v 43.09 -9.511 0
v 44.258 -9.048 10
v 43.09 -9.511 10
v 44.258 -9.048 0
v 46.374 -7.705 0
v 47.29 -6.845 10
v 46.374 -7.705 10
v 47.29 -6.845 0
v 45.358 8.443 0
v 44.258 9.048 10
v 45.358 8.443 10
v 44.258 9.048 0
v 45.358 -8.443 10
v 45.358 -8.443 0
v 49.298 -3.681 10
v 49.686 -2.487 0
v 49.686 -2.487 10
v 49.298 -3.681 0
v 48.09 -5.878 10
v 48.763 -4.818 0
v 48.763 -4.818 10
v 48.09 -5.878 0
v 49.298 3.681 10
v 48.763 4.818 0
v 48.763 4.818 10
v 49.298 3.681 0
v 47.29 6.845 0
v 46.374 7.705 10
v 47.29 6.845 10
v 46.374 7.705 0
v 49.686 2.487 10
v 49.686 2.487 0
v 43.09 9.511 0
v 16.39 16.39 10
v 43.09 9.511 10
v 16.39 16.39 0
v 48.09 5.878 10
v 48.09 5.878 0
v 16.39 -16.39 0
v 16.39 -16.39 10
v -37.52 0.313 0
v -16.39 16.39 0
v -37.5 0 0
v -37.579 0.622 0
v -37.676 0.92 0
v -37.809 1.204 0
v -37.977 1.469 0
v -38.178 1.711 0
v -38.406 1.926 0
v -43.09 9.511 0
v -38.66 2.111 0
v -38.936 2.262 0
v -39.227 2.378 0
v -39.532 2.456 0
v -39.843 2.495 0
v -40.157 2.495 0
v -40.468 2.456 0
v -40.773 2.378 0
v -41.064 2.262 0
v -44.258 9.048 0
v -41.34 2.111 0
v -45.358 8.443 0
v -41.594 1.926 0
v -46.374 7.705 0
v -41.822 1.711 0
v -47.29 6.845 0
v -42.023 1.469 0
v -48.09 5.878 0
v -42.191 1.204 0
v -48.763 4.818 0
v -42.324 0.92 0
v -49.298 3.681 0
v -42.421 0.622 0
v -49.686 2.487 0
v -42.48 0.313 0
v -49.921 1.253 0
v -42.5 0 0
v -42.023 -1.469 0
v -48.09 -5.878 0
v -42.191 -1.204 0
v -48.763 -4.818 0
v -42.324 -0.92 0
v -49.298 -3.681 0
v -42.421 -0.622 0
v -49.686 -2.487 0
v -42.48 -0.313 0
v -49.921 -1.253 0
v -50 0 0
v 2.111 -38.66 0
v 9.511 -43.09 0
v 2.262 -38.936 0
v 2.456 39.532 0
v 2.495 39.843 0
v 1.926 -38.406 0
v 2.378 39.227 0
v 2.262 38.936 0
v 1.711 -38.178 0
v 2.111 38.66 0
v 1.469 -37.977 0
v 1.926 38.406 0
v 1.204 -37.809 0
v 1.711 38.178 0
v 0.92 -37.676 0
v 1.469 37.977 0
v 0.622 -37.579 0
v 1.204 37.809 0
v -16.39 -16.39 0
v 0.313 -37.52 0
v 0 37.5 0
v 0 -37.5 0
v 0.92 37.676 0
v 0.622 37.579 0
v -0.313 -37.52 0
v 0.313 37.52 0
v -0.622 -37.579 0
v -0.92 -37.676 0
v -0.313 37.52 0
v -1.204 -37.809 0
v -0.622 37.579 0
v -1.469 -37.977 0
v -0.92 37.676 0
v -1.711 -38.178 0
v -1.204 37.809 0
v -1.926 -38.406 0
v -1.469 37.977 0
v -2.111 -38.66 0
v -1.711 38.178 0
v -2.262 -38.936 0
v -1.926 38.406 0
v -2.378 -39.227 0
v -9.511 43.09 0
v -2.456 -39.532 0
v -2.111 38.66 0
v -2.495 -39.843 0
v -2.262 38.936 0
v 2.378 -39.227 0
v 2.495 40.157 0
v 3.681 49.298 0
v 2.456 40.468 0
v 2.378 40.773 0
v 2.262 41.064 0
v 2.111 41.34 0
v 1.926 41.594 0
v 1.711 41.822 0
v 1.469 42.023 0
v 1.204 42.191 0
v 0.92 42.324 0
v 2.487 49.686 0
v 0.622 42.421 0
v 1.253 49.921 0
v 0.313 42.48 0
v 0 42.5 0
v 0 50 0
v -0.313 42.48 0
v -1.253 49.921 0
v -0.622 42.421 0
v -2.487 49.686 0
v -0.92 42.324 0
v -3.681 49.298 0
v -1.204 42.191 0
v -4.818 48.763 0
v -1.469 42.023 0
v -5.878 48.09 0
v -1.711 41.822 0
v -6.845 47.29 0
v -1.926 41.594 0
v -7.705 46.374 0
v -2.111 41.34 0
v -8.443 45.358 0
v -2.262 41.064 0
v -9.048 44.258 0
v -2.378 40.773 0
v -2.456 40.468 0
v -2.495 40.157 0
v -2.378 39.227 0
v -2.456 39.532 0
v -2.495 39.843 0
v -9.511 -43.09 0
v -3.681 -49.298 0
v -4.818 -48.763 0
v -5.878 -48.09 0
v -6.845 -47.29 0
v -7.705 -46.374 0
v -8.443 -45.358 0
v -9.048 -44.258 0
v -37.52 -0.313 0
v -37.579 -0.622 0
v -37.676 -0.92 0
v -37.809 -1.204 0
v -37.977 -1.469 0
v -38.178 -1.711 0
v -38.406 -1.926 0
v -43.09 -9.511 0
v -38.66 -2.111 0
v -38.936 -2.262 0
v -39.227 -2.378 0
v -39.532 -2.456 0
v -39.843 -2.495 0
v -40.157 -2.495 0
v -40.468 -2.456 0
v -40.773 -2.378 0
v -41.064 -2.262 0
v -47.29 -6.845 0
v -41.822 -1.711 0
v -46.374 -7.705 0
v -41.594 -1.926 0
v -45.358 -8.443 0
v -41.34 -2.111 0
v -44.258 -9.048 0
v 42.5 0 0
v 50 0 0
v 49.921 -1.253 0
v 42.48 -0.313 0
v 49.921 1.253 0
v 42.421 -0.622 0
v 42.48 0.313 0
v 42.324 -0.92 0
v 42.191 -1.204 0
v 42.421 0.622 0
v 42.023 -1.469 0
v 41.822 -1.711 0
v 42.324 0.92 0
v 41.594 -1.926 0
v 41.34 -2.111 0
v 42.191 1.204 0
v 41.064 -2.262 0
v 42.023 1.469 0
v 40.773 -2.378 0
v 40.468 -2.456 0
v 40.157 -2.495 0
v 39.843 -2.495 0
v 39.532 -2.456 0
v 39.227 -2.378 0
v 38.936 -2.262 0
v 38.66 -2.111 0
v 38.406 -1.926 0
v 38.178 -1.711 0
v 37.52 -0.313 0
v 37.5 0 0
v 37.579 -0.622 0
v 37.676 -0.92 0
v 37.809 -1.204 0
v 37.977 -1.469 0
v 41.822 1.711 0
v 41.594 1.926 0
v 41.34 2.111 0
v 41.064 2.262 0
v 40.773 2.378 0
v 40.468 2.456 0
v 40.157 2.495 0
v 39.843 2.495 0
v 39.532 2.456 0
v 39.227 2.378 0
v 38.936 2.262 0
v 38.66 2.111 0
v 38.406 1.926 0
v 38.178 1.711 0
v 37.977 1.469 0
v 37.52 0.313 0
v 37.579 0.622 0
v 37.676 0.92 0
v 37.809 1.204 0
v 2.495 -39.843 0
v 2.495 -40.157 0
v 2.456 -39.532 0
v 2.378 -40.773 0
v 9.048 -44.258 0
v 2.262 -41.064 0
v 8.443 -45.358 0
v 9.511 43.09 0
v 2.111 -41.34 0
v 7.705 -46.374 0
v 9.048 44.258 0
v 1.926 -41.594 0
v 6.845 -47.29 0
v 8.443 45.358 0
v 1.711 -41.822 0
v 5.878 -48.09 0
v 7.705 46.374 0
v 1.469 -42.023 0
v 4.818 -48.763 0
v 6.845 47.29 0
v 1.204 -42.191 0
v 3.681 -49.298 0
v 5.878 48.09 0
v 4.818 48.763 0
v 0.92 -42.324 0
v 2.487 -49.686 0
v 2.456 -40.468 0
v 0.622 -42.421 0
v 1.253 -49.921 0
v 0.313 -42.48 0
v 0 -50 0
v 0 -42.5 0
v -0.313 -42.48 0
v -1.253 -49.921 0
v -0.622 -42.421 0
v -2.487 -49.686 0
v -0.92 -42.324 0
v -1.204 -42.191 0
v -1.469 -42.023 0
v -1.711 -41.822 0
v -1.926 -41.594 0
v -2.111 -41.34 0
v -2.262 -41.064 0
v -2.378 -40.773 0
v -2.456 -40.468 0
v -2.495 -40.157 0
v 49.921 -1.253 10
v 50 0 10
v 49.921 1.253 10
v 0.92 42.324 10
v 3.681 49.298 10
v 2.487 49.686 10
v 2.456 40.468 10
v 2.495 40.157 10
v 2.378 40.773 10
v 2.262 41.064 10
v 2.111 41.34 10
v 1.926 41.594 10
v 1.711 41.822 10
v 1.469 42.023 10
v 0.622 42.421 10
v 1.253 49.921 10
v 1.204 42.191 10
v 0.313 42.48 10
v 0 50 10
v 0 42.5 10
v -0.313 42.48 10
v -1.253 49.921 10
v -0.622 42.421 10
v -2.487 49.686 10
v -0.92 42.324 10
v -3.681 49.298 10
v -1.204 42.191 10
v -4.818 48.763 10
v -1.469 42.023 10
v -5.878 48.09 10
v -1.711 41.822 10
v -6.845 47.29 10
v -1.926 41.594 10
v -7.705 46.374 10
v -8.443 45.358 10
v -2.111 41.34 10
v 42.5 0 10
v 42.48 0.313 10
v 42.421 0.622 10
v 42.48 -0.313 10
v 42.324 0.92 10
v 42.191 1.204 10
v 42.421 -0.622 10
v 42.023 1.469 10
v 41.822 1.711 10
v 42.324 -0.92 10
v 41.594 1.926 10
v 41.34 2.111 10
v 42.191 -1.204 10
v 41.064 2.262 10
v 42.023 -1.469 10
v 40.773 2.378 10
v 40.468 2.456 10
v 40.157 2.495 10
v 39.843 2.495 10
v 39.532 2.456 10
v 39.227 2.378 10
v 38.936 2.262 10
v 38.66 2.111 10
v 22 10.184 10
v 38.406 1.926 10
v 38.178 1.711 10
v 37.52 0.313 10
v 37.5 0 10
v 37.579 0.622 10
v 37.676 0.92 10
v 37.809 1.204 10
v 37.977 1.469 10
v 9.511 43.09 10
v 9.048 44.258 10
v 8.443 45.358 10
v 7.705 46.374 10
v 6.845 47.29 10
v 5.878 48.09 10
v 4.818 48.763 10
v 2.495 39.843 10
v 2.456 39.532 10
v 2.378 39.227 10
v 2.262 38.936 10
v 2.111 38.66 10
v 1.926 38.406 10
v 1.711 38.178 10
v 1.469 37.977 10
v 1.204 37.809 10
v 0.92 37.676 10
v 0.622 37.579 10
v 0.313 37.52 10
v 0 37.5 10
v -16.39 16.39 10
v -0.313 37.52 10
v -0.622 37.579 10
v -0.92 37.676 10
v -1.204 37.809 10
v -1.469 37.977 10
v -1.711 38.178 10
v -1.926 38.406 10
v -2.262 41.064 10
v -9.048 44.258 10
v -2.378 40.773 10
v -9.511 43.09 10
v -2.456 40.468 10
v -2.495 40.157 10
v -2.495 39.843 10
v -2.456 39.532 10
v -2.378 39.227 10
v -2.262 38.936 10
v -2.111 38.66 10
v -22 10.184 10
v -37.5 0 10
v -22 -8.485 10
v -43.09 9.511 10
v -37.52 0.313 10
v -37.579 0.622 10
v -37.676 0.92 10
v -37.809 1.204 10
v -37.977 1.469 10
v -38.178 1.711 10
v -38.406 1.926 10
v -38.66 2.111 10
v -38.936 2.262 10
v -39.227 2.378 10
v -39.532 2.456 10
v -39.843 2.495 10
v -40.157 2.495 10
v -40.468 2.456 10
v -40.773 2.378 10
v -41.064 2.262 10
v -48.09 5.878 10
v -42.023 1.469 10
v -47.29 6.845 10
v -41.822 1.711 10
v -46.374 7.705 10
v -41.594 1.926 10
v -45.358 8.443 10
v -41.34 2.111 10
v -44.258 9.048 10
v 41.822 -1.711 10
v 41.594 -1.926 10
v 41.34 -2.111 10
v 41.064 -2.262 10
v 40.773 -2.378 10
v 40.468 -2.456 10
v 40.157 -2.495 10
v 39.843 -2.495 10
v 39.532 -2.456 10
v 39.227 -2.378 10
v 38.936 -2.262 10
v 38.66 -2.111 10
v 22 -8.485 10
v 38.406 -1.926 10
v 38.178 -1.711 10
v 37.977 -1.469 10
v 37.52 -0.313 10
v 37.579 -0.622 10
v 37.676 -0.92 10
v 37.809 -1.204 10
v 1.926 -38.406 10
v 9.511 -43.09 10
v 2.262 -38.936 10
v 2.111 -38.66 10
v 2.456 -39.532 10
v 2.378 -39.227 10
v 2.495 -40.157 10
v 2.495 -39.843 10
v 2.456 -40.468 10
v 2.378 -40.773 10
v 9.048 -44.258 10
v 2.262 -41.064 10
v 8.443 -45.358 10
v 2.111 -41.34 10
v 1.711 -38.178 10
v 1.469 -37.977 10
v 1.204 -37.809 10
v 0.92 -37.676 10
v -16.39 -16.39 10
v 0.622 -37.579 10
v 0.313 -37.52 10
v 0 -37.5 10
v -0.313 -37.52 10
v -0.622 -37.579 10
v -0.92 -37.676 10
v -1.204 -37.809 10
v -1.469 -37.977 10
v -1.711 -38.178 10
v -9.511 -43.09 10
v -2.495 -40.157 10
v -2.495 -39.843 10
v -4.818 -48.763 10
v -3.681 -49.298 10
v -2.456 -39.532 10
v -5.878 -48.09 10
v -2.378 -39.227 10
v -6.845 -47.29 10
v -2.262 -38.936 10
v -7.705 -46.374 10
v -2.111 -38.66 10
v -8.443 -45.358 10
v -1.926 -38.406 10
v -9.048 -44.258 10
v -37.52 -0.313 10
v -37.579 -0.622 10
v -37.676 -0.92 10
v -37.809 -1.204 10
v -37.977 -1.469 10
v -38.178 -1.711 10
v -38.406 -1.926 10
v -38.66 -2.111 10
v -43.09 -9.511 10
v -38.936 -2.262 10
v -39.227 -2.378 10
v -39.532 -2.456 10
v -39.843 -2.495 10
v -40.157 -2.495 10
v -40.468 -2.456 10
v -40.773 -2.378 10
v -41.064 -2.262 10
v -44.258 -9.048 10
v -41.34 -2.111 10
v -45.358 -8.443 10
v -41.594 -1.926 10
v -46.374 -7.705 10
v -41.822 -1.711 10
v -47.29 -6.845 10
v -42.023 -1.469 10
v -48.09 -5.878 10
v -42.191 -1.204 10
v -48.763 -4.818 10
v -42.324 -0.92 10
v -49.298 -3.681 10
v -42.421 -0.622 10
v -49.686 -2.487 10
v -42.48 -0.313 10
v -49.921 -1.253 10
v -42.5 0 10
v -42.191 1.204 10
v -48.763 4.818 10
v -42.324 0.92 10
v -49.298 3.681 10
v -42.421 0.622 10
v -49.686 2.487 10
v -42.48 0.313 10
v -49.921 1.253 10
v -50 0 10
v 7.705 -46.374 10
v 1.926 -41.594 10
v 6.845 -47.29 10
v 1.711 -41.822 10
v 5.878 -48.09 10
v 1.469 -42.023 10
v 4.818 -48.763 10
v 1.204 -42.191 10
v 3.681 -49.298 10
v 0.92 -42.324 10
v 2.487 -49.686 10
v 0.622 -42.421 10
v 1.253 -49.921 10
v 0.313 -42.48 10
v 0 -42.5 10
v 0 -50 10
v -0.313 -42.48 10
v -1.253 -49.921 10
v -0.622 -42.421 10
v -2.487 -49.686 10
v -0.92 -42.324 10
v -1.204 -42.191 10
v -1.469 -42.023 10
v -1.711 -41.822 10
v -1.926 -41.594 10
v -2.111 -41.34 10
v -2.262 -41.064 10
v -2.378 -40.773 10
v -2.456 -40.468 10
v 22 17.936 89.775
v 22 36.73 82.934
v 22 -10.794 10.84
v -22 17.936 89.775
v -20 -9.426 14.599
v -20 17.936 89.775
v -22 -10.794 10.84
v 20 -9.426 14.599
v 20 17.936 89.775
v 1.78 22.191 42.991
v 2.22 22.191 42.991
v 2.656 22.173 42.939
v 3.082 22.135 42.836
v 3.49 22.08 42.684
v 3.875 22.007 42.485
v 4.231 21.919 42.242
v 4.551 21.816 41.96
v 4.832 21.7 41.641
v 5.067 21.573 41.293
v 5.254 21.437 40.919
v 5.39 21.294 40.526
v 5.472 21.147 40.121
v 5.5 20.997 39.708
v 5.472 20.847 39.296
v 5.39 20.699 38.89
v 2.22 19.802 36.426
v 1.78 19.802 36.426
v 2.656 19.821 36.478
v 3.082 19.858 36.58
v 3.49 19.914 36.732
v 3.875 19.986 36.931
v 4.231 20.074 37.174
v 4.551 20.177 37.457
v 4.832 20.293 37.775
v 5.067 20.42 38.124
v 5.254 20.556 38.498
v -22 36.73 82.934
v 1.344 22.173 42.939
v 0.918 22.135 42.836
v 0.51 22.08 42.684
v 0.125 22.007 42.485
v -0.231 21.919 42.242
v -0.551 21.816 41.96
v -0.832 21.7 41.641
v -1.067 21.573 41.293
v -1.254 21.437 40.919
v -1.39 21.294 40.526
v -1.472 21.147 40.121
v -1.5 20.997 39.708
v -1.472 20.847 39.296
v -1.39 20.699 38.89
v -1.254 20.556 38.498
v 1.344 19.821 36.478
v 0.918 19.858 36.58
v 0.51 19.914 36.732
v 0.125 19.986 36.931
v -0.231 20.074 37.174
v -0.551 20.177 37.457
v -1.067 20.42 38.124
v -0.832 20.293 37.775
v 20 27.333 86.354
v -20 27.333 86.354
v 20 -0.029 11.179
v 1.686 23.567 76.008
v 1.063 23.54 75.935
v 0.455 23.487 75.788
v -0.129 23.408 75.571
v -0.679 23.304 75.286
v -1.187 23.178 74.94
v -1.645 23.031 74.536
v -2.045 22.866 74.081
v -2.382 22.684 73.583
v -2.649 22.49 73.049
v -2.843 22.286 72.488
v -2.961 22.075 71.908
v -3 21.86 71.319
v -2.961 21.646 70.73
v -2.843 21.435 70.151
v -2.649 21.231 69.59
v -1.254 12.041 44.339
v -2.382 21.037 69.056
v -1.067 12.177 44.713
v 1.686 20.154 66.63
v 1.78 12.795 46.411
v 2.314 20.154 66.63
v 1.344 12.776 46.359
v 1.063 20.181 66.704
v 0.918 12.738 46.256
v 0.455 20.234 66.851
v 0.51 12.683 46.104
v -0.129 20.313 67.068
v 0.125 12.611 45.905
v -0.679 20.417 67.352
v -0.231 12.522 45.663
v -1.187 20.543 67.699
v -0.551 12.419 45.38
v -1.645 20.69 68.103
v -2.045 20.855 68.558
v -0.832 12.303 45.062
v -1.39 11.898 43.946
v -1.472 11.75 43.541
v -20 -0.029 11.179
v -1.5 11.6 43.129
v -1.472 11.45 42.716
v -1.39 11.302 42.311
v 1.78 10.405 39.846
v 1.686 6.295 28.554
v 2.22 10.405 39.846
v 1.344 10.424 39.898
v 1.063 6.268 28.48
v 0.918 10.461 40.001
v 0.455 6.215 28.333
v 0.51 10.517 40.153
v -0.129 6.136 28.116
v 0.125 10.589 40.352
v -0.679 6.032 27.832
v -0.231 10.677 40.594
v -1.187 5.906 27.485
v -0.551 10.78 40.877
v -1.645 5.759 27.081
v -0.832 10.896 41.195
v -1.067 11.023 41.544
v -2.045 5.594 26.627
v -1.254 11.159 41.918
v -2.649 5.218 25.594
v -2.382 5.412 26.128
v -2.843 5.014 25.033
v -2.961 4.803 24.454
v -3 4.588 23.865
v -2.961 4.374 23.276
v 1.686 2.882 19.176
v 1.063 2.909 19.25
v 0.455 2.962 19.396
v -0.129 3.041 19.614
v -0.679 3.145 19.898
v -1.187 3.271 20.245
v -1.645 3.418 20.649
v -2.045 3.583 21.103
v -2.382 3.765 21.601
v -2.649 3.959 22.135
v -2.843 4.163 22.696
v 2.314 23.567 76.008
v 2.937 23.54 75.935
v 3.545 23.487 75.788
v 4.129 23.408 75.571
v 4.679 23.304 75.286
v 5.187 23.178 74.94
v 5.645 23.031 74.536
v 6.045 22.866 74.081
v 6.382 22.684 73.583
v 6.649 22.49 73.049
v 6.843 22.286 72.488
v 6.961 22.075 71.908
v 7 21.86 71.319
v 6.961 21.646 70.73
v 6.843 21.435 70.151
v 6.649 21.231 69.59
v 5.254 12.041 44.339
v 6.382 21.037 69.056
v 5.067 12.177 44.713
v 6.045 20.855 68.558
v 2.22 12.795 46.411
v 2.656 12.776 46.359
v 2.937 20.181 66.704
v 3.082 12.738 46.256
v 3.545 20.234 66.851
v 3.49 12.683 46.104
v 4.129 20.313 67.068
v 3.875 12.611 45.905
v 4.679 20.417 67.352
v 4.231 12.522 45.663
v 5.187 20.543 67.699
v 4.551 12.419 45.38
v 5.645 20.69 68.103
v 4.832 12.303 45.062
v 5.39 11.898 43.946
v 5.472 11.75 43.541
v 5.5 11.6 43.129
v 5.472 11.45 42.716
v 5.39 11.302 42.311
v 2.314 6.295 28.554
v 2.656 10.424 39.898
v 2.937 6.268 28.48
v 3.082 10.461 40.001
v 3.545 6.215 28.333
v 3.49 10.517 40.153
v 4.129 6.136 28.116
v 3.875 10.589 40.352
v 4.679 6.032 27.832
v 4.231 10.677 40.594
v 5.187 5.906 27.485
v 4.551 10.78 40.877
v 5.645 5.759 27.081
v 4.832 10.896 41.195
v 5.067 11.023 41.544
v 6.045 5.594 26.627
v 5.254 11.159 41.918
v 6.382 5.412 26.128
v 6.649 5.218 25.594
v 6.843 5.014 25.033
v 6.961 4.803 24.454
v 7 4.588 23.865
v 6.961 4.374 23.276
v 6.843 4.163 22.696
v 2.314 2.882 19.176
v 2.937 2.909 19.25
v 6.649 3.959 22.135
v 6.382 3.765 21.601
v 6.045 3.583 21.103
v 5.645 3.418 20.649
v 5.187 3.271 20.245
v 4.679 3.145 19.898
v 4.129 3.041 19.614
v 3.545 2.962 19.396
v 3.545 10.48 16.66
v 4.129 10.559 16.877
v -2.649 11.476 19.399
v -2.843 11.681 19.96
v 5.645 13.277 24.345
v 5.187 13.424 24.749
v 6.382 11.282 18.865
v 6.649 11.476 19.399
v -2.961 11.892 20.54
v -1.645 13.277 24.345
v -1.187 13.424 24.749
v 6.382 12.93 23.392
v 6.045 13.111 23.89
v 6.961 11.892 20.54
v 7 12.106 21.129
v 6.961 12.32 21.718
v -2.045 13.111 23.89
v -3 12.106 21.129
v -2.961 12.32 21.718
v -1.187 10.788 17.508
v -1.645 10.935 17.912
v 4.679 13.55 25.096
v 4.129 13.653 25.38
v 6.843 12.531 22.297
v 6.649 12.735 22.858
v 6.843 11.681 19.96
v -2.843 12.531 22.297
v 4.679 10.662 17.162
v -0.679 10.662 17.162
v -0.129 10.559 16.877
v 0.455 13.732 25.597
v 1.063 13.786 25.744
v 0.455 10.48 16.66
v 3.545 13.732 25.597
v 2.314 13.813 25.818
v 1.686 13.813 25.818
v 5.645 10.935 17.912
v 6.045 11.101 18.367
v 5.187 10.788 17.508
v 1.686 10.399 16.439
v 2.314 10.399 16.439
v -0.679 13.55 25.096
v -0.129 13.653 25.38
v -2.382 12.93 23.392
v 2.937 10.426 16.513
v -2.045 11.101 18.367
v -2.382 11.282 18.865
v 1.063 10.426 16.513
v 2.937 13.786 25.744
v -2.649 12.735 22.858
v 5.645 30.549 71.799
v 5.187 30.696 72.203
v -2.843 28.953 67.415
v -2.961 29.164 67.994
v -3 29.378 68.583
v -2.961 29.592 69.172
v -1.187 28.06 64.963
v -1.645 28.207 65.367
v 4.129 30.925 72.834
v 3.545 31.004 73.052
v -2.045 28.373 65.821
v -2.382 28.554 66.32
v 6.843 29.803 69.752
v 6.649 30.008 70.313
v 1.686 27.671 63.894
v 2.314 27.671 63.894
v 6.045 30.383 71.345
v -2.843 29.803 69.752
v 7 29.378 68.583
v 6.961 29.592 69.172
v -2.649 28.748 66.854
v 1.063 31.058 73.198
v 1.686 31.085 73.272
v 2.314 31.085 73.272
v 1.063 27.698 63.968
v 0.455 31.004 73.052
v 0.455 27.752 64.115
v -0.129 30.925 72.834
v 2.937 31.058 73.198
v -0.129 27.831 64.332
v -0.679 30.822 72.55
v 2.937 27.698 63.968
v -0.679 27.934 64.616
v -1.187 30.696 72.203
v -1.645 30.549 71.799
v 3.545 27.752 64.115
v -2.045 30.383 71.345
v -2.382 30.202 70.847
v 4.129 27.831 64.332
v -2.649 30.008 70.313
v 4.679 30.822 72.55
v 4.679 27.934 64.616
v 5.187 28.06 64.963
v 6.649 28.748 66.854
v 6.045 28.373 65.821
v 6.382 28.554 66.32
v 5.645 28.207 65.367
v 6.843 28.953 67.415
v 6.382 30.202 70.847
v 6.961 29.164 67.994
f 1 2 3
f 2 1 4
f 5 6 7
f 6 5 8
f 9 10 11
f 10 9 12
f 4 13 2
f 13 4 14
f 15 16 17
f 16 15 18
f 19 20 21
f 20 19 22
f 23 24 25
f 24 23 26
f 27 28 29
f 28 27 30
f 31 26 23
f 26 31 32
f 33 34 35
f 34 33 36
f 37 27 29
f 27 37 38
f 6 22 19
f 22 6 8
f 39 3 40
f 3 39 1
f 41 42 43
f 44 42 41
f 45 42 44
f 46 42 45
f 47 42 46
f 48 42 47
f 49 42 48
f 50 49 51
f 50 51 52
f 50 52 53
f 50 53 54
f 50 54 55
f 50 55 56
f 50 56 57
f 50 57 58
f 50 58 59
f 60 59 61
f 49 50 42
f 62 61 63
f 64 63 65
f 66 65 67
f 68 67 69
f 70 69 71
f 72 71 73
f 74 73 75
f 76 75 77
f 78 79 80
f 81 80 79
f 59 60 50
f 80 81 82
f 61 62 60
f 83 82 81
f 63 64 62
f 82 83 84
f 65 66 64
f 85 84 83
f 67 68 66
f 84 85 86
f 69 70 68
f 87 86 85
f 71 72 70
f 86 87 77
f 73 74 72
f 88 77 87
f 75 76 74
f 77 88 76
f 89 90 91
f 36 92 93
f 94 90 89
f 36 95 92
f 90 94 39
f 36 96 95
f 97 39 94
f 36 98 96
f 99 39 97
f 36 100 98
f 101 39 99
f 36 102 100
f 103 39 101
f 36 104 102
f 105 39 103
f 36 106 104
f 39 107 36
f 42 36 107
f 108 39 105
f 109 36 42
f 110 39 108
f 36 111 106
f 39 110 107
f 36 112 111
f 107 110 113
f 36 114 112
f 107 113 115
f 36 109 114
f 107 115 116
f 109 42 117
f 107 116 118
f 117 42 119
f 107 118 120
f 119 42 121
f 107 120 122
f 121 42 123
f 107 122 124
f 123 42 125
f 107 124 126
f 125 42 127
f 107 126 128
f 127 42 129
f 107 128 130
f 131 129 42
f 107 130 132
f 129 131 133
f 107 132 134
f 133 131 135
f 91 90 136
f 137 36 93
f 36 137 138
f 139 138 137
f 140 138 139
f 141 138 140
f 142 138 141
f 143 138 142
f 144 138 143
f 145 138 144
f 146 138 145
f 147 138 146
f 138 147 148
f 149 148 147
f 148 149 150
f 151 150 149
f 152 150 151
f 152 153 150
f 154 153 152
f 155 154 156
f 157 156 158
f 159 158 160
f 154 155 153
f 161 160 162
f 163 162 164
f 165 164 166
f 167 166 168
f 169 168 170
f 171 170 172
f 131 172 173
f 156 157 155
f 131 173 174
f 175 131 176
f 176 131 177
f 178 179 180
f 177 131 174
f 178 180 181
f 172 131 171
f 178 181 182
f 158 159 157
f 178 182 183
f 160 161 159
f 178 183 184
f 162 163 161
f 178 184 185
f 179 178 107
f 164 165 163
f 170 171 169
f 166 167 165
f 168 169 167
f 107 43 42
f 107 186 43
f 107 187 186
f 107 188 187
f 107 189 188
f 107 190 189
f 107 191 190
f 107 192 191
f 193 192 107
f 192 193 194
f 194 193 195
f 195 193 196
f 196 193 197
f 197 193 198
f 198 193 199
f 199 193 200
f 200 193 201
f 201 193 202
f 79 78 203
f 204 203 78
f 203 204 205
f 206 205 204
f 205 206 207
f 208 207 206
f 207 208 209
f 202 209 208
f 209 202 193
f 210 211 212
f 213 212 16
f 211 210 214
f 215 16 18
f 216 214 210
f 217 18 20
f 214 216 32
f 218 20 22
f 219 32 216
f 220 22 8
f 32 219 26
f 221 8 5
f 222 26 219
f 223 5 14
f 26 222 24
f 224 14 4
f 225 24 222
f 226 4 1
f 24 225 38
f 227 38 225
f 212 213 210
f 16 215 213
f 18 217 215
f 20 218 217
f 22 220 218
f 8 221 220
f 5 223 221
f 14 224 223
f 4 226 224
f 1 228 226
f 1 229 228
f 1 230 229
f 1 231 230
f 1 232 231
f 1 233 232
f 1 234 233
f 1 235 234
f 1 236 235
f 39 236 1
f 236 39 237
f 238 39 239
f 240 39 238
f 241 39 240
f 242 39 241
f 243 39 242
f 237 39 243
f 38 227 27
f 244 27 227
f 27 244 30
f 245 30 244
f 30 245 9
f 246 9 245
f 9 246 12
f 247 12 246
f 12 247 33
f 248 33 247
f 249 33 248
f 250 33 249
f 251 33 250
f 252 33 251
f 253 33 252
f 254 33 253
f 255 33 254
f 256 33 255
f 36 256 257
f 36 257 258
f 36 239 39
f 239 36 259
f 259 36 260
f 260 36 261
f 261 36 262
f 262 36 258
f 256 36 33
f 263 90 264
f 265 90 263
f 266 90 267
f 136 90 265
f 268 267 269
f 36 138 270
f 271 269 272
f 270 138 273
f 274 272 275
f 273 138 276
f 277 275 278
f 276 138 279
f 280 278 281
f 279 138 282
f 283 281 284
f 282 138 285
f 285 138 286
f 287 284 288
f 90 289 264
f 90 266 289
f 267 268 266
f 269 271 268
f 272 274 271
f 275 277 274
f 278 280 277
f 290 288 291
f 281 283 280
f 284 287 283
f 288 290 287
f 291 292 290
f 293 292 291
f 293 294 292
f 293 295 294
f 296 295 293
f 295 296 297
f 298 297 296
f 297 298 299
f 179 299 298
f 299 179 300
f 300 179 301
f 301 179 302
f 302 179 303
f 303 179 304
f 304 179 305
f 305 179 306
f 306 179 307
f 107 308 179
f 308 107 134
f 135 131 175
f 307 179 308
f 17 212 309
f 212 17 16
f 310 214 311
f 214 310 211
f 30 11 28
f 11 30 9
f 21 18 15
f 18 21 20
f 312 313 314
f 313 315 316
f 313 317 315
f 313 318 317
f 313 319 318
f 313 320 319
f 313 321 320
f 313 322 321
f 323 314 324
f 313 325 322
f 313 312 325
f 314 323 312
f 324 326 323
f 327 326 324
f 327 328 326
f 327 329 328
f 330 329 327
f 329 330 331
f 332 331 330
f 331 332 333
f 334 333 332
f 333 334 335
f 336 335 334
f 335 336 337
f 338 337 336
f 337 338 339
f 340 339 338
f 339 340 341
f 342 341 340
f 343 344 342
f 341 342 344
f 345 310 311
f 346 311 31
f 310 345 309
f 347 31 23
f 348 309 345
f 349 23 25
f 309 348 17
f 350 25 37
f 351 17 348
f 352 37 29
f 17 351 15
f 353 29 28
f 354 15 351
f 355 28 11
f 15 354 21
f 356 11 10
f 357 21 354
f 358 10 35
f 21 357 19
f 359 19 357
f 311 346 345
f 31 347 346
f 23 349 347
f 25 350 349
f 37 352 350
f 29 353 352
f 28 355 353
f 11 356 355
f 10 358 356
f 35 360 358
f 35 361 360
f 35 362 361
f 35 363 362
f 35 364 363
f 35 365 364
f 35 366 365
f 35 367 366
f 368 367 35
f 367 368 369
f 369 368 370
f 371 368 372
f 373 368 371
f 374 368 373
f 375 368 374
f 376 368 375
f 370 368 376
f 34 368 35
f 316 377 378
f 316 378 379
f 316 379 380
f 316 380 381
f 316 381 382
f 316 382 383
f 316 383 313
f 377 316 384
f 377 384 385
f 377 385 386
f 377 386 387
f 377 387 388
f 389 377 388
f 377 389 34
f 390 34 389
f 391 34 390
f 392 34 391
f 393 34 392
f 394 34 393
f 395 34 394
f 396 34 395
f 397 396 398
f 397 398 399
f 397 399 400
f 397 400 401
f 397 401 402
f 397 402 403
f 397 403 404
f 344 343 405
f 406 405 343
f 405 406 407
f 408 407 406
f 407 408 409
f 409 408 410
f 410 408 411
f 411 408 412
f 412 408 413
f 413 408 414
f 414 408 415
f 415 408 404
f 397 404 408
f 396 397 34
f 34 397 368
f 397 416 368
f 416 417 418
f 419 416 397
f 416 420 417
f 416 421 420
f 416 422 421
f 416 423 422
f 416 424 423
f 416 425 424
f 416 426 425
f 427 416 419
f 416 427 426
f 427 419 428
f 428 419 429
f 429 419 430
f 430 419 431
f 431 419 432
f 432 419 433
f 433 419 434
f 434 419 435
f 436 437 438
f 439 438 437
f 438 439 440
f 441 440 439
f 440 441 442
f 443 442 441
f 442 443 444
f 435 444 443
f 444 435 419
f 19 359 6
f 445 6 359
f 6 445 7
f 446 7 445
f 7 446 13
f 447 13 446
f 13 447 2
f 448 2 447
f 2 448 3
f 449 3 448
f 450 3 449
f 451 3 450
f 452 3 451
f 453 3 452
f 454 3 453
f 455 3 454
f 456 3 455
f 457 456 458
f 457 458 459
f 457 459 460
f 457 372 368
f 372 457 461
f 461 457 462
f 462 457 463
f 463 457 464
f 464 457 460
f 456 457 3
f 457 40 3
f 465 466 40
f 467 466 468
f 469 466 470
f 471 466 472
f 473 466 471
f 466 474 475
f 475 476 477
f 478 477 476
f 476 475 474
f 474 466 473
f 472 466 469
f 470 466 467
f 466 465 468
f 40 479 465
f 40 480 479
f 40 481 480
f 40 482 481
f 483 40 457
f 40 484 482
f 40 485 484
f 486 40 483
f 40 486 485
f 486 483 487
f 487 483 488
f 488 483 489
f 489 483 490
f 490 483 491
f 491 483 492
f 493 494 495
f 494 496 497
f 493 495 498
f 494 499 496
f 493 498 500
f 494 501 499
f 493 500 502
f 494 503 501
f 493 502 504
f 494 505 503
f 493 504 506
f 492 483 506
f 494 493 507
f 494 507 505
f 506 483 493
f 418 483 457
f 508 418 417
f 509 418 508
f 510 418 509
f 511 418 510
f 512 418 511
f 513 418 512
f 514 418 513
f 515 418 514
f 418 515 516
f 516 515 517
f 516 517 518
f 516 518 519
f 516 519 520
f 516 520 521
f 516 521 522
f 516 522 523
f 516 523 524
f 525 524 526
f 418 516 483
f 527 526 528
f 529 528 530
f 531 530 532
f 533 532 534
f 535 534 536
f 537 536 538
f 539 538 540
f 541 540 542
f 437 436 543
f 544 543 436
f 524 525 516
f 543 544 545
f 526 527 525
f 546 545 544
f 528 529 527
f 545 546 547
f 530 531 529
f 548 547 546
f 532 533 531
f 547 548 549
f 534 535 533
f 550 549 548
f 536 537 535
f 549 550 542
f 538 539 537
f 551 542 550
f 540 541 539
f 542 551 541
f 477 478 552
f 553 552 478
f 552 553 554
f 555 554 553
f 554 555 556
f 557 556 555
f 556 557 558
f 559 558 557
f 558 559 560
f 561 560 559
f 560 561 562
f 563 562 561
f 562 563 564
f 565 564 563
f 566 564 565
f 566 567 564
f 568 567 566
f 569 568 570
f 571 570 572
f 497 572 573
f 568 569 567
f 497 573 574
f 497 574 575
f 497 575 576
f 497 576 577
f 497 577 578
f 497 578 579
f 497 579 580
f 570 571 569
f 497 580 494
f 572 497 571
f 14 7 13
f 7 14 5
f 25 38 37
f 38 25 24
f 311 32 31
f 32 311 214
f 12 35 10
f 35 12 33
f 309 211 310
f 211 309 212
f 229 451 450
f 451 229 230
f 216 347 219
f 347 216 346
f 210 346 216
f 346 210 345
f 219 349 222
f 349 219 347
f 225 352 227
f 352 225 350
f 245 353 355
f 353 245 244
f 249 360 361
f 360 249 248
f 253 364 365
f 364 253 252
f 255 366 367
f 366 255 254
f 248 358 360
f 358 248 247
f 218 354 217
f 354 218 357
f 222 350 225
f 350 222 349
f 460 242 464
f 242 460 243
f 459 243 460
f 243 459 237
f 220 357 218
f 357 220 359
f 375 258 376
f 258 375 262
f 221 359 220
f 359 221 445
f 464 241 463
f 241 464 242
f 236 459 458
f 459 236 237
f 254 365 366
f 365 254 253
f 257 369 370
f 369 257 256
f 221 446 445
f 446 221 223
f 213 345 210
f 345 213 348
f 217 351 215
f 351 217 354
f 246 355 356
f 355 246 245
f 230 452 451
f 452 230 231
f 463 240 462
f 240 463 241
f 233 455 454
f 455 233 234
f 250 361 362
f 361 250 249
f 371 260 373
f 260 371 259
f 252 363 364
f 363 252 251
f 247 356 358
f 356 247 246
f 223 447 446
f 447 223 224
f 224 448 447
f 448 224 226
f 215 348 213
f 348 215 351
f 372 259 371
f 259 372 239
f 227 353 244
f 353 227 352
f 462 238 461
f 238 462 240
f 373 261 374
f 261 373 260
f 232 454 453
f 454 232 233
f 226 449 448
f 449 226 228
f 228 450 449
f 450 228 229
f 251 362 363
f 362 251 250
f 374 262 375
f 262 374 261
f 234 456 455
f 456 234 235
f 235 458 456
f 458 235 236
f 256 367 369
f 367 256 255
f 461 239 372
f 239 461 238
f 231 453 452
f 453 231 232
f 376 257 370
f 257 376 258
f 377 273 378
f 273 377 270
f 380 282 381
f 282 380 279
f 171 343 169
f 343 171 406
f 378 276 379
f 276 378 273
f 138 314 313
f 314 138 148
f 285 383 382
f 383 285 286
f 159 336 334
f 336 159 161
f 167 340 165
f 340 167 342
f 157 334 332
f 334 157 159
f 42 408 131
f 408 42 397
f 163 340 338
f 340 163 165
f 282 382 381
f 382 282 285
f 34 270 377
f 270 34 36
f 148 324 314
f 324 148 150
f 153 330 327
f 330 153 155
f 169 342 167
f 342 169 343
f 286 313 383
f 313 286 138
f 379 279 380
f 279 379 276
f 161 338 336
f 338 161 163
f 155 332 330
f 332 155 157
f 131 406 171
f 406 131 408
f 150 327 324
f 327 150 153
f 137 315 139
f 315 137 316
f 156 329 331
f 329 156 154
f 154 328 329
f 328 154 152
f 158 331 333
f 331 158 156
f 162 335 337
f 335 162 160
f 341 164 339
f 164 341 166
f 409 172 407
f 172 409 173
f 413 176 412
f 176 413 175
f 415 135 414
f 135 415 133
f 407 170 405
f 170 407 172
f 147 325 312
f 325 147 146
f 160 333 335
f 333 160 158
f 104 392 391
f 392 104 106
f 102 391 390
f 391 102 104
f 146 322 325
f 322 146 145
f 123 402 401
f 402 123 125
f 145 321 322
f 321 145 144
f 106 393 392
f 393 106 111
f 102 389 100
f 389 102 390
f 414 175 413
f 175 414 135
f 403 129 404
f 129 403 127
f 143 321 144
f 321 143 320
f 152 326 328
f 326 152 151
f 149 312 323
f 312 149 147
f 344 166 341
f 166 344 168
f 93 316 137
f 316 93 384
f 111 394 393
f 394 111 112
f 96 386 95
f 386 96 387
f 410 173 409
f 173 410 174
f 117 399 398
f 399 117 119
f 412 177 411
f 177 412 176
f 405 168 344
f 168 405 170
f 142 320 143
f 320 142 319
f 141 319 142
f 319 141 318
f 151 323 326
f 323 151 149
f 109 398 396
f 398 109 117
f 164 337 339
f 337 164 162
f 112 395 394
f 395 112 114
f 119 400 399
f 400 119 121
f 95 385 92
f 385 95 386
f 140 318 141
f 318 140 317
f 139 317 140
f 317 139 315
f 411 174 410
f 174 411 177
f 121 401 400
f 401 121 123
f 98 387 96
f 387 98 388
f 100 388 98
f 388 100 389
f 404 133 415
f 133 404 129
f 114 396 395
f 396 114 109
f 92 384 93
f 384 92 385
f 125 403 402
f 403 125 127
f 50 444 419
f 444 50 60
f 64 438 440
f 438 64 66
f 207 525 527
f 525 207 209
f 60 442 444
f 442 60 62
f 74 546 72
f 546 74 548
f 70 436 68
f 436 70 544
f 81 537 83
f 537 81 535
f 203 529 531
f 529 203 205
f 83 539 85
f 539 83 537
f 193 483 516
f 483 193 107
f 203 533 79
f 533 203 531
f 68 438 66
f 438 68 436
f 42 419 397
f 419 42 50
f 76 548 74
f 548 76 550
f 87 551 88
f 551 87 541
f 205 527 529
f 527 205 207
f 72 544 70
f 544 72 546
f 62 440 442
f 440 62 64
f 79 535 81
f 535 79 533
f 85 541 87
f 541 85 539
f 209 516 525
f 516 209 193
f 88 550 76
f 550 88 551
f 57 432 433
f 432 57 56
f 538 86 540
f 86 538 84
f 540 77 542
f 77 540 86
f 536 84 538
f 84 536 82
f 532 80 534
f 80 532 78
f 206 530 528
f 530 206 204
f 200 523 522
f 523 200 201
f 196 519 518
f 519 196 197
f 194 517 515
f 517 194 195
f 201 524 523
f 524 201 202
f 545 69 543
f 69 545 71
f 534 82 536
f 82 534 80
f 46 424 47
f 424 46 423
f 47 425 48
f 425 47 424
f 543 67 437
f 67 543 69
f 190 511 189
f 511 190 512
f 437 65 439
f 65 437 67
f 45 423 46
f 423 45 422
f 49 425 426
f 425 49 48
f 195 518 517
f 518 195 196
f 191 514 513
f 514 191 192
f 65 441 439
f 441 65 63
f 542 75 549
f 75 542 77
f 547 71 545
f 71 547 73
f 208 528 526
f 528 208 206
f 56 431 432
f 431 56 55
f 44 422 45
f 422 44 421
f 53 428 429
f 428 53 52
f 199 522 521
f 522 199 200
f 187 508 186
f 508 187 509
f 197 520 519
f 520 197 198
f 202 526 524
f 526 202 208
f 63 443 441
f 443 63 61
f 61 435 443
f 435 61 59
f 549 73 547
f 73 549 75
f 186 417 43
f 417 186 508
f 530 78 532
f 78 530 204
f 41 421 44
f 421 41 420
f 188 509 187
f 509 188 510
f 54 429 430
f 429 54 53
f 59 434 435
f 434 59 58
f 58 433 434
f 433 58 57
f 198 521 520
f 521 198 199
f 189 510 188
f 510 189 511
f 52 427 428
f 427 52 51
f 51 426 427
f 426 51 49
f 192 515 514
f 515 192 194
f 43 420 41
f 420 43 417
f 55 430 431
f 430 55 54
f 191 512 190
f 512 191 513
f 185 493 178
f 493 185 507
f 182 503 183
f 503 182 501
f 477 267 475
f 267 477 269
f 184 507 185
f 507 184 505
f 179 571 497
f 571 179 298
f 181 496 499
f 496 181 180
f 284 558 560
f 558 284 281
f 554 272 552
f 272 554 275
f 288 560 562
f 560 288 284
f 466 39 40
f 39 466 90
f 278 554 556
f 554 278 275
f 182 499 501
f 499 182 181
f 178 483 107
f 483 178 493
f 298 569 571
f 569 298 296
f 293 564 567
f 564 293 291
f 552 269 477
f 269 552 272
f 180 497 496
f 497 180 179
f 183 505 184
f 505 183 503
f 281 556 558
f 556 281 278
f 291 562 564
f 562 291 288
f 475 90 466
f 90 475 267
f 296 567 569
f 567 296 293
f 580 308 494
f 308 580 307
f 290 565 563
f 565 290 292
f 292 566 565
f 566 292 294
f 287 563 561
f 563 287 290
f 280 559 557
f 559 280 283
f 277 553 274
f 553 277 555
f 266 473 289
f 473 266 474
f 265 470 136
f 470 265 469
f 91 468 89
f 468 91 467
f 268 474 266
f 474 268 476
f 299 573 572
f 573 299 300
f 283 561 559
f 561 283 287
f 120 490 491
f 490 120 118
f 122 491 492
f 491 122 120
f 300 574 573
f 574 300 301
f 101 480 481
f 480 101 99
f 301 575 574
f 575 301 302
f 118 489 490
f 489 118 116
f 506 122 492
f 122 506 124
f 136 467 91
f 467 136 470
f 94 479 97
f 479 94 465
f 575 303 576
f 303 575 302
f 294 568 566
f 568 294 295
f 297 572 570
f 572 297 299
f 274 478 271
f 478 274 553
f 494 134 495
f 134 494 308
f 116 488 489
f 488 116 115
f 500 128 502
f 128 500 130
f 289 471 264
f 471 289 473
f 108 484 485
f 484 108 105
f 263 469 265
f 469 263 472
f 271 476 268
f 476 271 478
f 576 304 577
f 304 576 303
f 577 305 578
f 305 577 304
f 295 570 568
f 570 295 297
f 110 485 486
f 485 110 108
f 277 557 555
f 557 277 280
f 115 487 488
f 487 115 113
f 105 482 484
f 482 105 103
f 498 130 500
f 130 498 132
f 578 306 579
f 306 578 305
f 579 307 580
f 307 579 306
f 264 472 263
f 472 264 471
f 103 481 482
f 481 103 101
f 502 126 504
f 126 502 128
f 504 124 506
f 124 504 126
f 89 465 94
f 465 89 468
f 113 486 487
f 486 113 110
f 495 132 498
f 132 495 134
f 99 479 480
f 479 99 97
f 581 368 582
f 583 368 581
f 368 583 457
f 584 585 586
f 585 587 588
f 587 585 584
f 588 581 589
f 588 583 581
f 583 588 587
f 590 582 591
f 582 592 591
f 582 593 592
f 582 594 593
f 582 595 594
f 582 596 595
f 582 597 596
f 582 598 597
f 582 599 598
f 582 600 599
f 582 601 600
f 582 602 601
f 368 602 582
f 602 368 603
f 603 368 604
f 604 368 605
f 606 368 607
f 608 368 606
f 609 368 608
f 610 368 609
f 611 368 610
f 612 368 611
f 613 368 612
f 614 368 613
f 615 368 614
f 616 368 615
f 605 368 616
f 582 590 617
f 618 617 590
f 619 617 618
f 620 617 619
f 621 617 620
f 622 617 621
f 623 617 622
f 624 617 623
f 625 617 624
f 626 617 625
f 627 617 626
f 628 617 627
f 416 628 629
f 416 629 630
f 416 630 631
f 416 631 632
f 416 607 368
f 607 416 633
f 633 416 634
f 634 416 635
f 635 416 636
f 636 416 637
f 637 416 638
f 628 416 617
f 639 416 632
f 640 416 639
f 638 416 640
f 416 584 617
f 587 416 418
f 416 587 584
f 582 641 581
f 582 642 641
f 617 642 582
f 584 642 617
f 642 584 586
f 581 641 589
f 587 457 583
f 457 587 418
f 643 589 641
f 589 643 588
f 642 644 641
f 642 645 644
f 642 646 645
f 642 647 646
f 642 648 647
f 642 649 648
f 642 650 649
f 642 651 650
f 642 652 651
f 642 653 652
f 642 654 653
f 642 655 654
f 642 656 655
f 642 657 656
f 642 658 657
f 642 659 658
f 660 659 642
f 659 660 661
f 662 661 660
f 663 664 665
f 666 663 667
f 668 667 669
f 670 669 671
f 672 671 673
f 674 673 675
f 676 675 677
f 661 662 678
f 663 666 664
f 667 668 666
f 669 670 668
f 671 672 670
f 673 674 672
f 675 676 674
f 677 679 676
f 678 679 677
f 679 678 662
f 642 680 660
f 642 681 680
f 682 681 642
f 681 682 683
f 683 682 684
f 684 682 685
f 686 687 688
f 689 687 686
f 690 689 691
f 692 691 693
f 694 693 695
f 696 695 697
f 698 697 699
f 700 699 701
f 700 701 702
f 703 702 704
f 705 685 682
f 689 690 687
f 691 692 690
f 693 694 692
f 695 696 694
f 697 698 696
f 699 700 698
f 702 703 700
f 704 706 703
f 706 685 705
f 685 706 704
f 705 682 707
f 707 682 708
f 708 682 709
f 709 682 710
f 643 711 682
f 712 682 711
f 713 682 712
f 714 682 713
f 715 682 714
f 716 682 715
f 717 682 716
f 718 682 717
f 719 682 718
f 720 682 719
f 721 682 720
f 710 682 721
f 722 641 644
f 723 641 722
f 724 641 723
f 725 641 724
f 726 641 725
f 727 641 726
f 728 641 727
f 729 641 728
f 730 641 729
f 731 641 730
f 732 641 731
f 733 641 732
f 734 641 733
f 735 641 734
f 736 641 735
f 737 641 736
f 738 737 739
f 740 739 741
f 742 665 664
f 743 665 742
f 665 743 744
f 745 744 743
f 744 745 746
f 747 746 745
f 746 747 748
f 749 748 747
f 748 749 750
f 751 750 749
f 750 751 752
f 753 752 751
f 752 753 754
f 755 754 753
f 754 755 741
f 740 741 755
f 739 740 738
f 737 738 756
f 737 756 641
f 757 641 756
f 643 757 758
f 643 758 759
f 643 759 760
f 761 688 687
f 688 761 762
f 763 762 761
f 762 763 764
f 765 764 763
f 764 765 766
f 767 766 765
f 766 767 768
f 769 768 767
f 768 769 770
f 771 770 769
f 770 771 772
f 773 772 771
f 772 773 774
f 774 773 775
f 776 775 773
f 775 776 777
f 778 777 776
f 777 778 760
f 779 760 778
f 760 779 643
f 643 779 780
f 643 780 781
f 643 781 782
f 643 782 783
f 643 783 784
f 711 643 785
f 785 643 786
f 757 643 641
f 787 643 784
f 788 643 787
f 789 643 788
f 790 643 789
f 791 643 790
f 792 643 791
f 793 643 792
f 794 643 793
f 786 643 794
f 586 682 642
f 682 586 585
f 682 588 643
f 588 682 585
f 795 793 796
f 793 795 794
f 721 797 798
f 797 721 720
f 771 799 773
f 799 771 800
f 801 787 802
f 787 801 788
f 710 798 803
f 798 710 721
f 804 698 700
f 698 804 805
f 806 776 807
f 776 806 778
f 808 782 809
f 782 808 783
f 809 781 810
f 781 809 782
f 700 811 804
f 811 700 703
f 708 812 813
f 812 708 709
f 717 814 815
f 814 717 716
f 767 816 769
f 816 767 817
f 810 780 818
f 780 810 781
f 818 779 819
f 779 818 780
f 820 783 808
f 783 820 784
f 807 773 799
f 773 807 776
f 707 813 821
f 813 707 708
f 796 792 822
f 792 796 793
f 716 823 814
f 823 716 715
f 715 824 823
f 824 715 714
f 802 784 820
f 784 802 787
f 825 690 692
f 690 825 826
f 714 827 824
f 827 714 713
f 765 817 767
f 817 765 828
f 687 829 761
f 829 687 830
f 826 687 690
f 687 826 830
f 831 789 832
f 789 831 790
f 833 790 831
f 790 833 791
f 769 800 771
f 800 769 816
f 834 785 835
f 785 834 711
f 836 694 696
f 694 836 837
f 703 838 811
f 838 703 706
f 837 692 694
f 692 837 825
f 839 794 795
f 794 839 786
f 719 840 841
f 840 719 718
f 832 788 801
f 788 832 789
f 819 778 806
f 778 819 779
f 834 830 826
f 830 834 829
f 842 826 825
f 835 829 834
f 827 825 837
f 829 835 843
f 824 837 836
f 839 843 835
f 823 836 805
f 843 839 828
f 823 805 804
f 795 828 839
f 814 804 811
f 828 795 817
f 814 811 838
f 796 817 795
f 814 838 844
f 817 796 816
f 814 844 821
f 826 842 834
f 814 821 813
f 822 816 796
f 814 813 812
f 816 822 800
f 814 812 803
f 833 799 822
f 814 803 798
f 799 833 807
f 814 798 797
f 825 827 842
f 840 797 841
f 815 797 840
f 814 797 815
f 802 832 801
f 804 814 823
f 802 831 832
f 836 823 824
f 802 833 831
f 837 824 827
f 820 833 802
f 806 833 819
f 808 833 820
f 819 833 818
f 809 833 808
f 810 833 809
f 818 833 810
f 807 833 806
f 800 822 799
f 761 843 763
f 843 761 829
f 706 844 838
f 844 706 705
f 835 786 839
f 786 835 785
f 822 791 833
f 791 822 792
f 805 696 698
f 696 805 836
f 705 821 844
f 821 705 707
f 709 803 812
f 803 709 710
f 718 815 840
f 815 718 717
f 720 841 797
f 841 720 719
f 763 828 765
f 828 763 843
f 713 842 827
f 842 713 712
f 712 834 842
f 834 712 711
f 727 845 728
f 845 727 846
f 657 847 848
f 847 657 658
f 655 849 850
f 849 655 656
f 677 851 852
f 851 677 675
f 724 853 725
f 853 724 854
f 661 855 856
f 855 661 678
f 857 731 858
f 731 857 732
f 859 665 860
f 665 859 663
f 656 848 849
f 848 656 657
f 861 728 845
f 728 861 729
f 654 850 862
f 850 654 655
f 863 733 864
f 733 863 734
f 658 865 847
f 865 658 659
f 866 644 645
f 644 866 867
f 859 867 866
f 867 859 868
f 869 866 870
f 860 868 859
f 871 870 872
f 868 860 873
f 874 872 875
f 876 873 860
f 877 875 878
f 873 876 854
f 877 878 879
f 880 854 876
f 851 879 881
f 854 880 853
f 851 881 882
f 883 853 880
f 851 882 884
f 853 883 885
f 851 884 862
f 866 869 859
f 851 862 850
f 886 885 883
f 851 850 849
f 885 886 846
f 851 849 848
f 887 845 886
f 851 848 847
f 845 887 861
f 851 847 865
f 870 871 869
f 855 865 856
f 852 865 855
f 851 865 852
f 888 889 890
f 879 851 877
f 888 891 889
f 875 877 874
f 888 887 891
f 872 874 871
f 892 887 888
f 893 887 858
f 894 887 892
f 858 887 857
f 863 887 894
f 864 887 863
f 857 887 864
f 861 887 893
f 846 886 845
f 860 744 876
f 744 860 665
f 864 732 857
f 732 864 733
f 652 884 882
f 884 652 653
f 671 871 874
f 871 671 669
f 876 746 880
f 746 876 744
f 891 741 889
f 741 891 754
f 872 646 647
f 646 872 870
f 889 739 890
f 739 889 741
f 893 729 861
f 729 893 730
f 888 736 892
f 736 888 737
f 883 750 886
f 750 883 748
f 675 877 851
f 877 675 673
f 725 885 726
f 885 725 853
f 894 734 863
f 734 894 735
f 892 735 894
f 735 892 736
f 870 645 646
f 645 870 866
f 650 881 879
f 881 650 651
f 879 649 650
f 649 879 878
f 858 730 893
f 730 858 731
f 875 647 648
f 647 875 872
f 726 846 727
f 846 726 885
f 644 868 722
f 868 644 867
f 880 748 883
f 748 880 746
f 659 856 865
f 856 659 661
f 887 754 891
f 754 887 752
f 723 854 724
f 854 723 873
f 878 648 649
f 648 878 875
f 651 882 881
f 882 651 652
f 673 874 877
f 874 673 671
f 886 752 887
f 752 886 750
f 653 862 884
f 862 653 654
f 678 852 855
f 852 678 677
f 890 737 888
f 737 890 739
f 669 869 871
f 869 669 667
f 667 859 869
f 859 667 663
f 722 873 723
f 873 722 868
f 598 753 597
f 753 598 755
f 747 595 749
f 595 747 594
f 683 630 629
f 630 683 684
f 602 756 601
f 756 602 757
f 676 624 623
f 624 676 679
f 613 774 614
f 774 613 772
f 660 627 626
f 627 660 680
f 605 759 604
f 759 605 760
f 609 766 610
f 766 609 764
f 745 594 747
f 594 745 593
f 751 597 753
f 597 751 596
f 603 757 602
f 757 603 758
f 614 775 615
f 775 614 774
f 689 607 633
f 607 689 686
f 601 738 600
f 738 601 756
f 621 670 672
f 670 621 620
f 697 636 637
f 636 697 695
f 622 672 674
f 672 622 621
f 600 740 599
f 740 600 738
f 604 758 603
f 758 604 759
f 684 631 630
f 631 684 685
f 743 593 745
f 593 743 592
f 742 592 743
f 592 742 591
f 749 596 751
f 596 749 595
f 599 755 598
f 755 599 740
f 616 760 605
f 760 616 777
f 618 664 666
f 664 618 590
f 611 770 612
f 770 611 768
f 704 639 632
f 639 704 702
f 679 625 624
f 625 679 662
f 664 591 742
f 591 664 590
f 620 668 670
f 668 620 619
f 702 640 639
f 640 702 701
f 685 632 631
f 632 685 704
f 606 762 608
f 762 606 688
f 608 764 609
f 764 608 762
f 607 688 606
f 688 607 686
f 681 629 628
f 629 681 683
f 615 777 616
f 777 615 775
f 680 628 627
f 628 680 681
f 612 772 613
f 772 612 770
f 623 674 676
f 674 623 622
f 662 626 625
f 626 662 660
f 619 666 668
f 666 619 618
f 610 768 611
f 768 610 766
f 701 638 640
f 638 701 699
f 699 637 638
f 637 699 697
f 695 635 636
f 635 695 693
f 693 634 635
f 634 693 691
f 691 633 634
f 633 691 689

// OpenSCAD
$fn = 50;

armWidth = 40;
armThickness = 10;
holderLength = 80;
holderThickness = 10;
shellWidth = 2;

holeOuterDia = 10;
holeInnerDia = 9.5;

screwHoleDia = 7;

firstHoleDist = 15.5;
screwHoleDist = 36;
secondHoleDist = 66;

wurfarmHalter();

module wurfarmHalter(){
    
    
    
    base();
    
    translate([-shellWidth - armWidth/2,8,4])
    rotate([70,0,0])
    holder();
    
}

module base(){
    
    
    union(){
         
        rotate([0,0,0])
        baseArm();
        
        
        rotate([0,0,90])
        baseArm();
        
        rotate([0,0,180])
        baseArm();
        
        rotate([0,0,270])
        baseArm();
           
           
    }
    
    
    
}

module baseArm(){
    
    difference(){
        hull(){
                    cylinder(d = 40, h = 10);
                    
                    translate([40,0,0])
                    cylinder(d = 20, h = 10);
                   
        }
        
        translate([40,0,-1])
        cylinder(d = 5, h = 15);
        
    }
    
}



module holder(){
    
    difference(){
        cube([armWidth + 2* shellWidth, holderLength + shellWidth * 2, holderThickness + armThickness]);
        
        translate([shellWidth, shellWidth*2, holderThickness])
        cube([armWidth, holderLength  + shellWidth, holderThickness + armThickness]);
        
        translate([armWidth/2 + shellWidth*2, shellWidth + firstHoleDist, shellWidth])
        hole();
        
        translate([armWidth/2 + shellWidth*2, shellWidth + secondHoleDist, shellWidth])
        hole();
        
        translate([armWidth/2 + shellWidth*2, shellWidth + screwHoleDist, -1])
        cylinder(d = screwHoleDia, h = 20);
        
    }
    
    
}

module hole(){
    
    difference(){
        
        cylinder(d = holeOuterDia, h = 15);
        
        *translate([0,0,-1])
        cylinder(d = holeInnerDia, h = 20);
        
    }
    
}
